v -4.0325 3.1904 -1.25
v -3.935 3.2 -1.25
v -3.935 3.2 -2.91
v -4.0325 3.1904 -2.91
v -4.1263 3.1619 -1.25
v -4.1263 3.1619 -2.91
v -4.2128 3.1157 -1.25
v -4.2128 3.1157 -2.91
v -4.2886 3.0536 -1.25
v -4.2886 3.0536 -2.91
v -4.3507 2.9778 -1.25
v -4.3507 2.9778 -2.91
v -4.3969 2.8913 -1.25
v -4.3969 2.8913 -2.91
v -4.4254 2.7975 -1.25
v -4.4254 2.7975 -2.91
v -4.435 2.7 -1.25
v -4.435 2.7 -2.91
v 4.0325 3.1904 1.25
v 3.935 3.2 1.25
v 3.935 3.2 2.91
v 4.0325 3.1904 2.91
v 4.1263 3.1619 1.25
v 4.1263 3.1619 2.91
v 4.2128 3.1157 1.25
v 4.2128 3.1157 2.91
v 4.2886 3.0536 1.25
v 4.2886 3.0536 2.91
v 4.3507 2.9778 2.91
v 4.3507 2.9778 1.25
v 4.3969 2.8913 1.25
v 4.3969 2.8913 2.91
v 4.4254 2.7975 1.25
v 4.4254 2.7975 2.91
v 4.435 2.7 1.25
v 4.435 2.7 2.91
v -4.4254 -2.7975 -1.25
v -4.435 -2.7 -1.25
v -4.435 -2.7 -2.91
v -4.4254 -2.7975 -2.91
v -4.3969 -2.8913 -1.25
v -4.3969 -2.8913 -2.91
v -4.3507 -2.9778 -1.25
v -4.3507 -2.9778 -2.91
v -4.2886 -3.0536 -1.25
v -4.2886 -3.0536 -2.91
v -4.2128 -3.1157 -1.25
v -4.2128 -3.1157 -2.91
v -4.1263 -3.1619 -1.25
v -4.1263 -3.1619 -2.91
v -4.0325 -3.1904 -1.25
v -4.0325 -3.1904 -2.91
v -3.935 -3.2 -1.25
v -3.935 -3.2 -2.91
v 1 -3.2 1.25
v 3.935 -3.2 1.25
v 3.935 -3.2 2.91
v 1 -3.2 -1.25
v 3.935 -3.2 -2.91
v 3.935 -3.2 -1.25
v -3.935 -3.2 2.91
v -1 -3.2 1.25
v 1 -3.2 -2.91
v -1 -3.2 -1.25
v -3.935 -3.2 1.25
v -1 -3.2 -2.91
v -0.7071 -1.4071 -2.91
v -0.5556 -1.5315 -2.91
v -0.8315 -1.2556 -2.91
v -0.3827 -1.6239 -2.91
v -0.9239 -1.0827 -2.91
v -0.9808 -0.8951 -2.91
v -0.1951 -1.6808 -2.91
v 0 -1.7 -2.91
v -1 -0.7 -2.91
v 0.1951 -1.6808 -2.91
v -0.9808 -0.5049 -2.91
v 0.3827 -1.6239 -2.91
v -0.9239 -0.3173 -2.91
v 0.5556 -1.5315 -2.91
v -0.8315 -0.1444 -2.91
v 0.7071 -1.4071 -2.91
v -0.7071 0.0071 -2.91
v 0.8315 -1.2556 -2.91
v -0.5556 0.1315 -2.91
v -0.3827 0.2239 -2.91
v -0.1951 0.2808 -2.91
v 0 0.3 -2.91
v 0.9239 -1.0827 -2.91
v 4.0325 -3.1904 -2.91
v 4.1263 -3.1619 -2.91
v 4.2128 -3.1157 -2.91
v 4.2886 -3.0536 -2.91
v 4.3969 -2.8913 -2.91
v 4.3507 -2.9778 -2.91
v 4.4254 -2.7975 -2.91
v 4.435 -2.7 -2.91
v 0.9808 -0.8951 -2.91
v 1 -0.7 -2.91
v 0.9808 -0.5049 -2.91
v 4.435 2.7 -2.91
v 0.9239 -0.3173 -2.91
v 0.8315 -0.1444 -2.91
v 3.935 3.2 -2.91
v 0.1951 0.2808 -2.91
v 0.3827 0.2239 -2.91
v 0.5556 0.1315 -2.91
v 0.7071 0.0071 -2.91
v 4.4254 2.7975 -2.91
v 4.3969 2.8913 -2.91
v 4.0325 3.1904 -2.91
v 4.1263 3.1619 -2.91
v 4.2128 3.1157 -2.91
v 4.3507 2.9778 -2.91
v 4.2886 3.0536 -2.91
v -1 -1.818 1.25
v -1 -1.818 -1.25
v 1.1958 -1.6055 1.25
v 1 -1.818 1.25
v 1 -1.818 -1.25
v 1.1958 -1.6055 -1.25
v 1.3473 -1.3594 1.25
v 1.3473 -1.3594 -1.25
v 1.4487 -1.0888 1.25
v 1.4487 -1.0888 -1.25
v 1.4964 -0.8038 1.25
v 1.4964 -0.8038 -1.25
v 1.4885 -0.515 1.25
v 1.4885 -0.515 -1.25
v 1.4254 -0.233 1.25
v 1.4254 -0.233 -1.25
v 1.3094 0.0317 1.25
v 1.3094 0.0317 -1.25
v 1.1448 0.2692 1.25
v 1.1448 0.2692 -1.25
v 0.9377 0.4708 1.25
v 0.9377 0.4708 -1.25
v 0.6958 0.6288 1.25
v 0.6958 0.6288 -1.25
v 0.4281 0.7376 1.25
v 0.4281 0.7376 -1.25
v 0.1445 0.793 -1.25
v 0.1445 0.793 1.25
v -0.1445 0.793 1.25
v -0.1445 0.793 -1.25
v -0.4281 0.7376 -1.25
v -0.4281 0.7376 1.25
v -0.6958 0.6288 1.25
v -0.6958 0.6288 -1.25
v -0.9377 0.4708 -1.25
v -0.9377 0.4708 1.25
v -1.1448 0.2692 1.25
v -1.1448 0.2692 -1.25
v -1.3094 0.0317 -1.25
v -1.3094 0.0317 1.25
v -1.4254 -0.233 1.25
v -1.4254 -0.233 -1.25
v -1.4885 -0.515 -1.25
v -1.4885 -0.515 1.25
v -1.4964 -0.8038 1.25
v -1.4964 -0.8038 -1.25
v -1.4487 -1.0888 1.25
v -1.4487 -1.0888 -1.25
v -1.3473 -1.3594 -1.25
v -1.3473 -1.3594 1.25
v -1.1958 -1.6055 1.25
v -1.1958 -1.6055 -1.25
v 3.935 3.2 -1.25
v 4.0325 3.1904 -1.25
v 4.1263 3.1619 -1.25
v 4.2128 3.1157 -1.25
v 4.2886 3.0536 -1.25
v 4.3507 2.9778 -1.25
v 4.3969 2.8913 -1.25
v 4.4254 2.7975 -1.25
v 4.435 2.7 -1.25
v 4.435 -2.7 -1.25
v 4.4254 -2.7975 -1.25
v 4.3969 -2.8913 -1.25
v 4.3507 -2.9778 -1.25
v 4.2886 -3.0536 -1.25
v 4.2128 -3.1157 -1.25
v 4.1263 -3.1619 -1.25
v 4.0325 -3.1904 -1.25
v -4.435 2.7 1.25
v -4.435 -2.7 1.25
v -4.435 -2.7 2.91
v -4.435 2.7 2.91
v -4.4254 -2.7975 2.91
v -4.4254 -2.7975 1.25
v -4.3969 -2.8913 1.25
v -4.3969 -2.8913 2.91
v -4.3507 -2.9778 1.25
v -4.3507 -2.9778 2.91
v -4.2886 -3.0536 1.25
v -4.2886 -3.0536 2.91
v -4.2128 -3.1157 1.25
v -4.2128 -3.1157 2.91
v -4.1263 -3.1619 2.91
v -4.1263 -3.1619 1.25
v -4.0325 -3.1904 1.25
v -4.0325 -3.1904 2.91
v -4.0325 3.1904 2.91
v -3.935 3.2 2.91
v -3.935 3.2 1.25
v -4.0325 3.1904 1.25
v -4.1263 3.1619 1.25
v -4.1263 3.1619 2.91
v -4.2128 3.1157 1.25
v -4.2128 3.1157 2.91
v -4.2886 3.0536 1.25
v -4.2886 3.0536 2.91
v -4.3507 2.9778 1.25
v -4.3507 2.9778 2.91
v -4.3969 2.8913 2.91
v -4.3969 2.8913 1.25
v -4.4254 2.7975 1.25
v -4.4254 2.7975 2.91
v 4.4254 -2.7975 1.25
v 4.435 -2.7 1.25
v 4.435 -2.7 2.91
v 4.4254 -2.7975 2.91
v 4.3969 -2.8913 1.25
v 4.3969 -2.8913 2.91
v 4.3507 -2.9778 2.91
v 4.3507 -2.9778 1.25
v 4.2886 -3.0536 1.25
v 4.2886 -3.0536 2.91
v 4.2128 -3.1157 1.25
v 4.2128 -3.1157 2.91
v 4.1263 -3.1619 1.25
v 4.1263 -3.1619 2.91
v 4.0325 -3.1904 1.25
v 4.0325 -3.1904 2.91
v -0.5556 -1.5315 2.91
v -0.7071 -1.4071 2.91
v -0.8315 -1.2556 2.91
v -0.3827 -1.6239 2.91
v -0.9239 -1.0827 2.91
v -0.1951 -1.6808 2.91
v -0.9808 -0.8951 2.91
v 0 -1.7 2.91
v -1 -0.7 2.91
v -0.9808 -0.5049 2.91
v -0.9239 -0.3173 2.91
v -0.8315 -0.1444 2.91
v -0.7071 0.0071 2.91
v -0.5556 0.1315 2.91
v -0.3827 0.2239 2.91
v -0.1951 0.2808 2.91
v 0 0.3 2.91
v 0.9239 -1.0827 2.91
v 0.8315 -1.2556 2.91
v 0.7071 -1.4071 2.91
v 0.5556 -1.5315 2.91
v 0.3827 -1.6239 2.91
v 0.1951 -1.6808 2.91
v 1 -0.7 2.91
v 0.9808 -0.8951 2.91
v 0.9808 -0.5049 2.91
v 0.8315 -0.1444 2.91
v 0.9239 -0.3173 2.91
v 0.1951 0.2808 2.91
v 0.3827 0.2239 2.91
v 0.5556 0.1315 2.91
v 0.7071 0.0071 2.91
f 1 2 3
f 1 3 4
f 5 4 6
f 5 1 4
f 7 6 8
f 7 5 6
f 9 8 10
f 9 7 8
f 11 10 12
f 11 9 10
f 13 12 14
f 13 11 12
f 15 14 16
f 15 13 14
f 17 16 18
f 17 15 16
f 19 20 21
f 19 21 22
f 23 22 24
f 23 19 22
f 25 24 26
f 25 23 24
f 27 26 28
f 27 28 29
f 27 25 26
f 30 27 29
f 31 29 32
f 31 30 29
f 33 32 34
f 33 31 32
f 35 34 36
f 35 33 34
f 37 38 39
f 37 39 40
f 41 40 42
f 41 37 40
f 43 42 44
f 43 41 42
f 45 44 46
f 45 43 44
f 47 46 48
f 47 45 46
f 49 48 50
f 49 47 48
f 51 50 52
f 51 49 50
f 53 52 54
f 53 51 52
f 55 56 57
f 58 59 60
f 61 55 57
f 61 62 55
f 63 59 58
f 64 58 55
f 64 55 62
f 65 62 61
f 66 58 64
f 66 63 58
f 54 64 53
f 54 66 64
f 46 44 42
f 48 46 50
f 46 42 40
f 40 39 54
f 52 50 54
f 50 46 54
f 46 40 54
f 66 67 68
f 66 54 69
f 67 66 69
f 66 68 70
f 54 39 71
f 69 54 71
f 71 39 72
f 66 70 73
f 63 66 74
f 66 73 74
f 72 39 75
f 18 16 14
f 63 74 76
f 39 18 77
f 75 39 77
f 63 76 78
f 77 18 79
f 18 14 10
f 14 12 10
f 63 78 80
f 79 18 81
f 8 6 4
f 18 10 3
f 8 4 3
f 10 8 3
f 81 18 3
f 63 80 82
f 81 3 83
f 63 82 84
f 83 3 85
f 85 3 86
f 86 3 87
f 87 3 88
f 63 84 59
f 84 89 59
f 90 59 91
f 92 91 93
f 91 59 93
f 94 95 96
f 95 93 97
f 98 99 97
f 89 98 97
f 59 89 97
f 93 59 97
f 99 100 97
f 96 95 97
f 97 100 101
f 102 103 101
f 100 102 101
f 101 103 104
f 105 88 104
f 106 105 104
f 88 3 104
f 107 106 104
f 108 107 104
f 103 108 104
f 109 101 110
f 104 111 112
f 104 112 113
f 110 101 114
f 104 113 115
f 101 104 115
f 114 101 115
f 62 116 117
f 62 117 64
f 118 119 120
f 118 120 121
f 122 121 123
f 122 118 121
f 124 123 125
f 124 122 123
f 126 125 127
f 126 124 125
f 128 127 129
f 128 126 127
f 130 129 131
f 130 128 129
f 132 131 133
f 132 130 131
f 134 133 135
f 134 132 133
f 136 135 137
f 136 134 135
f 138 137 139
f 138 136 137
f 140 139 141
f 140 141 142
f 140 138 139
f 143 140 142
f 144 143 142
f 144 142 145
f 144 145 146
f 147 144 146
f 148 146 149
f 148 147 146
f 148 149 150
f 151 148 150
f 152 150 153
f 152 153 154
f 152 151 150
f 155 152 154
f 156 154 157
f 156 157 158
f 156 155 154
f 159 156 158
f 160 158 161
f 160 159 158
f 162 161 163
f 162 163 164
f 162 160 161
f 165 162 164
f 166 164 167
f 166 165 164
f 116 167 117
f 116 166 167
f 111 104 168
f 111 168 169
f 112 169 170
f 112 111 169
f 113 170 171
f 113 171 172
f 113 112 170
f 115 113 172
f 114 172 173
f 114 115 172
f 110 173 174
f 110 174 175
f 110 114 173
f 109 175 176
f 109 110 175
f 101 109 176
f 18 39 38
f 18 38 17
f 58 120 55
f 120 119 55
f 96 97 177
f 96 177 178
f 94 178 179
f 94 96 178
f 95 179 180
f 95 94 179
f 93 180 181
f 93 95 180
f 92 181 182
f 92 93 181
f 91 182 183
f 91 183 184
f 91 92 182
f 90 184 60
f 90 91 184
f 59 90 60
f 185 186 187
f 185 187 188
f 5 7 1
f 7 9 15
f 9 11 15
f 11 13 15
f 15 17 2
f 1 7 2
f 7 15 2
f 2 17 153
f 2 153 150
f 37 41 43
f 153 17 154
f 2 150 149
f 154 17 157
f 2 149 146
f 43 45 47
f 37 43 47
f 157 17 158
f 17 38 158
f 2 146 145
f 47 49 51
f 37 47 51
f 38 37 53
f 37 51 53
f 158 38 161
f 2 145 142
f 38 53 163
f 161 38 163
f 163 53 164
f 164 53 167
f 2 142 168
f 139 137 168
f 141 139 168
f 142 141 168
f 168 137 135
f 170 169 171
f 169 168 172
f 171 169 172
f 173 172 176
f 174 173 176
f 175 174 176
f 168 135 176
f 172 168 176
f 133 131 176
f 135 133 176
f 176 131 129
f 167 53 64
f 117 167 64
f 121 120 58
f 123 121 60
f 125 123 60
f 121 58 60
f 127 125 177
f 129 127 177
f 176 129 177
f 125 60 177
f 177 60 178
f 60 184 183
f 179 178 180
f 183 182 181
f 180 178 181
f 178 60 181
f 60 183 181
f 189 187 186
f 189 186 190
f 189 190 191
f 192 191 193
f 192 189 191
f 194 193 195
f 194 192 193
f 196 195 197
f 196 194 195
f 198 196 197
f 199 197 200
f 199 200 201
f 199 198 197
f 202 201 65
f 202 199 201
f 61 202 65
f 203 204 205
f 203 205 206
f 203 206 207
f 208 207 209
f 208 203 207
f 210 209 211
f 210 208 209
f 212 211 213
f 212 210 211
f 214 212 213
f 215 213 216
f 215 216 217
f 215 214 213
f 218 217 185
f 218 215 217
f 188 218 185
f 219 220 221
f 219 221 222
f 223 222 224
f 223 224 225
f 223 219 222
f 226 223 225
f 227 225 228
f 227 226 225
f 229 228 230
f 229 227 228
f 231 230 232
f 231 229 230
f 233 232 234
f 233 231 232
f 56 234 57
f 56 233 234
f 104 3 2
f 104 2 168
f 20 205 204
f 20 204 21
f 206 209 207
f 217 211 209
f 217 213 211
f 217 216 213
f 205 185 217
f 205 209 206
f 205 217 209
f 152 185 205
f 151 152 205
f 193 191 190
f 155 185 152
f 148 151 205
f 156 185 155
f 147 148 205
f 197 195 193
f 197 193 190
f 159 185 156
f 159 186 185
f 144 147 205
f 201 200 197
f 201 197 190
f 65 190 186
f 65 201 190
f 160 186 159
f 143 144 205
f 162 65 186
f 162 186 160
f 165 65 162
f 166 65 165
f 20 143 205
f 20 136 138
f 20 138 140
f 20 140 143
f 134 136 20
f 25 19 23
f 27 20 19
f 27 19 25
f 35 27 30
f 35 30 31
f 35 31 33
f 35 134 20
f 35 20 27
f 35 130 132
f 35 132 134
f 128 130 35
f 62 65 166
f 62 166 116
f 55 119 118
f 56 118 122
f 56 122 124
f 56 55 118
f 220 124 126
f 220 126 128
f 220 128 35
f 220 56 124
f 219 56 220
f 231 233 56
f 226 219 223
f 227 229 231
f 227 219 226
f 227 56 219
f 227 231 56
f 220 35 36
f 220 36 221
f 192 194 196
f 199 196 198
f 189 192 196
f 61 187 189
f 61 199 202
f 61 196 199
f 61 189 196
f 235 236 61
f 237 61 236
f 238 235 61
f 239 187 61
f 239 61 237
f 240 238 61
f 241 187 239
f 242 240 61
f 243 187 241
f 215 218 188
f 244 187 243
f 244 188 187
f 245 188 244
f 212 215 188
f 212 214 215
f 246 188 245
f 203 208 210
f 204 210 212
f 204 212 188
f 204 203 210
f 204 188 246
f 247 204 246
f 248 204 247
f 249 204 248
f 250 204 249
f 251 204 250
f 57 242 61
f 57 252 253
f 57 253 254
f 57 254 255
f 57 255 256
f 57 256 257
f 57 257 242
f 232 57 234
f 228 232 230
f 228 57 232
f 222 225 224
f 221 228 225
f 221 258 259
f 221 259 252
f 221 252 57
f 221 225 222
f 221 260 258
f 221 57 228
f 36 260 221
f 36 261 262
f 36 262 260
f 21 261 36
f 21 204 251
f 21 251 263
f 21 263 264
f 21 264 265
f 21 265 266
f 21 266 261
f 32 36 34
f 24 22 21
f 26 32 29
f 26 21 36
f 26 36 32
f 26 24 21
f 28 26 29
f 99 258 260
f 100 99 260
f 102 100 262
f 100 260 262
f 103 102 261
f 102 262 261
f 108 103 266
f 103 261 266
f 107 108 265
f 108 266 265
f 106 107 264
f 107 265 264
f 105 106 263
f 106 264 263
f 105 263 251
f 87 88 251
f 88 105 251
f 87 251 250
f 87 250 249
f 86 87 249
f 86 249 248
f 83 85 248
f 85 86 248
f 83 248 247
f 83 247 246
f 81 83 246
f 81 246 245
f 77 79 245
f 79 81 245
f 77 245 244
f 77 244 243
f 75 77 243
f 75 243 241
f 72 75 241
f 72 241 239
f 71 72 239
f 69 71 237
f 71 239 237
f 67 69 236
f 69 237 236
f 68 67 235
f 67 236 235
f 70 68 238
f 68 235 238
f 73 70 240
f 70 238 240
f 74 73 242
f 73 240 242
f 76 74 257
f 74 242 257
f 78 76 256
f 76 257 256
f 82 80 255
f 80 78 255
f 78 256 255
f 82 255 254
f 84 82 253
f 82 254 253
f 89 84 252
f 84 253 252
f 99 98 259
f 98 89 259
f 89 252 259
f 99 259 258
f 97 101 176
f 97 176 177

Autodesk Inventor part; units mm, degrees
ref_plane "YZ Plane" through (0, 0, 0) normal (1, 0, 0) x (0, 1, 0)
ref_plane "XZ Plane" through (0, 0, 0) normal (0, 1, 0) x (-1, 0, 0)
sketch "Sketch1" plane through (0, 0, 0) normal (0, 0, 1) x (1, 0, 0)
  line L0 (-4.435, 3.2) -> (4.435, 3.2)
  line L1 (4.435, 3.2) -> (4.435, -3.2)
  line L2 (4.435, -3.2) -> (-4.435, -3.2)
  line L3 (-4.435, -3.2) -> (-4.435, 3.2)
  line L4 (0, 0) -> (4.435, 0) construction
  line L5 (0, 0) -> (0, -3.2) construction
  line L6 (0, 0) -> (0, 3.2) construction
  line L7 (0, 0) -> (-4.435, 0) construction
  dimension "d0" = 8.87
  dimension "d1" = 6.4
extrude "Extrusion1" add sketch "Sketch1" along normal mid plane 5.82
fillet "Fillet1" radius 0.5 4 edges at (4.435, -3.2, 0) (4.435, 3.2, 0) (-4.435, 3.2, 0) (-4.435, -3.2, 0)
sketch "Sketch2" plane through (0, 0, 2.91) normal (0, 0, 1) x (1, 0, 0)
  line L0 (-3.935, 3.2) -> (3.935, 3.2) projected
  circle A0 centre (0, -0.7) radius 1
  point P0 (0, 0)
  dimension "d5" = 3.9
  dimension "d6" = 2
extrude "Extrusion2" cut sketch "Sketch2" against normal through all
ref_plane "Work Plane1" through (-3.935, -0.7, 2.91) normal (0, 1, 0) x (1, 0, 0)
sketch "Sketch5" plane through (-3.935, -0.7, 2.91) normal (0, 1, 0) x (1, 0, 0)
  line L0 (5.435, 1.66) -> (10.1042, 1.66)
  line L1 (10.1042, 1.66) -> (10.1042, 4.16)
  line L2 (10.1042, 4.16) -> (5.435, 4.16)
  line L3 (5.435, 4.16) -> (5.435, 1.66)
  line L4 (3.935, -1.746) -> (3.935, 6.402) projected
  line L5 (7.87, 0) -> (0, 0) projected
  line L6 (0, 5.82) -> (7.87, 5.82) projected
  dimension "d10" = 1.5
  dimension "d11" = 1.66
  dimension "d12" = 1.66
revolve "Revolution1" cut sketch "Sketch5" angle 360 about axis through (0, -0.7, 2.91) along (0, 0, -1)
sketch "Sketch6" plane through (0, 0, 2.91) normal (0, 0, 1) x (1, 0, 0)
  circle A0 centre (0, -0.7) radius 1 projected
  line L0 (3.935, -3.2) -> (-3.935, -3.2) projected
  line L1 (-1, -0.7) -> (-1, -3.2)
  line L2 (1, -0.7) -> (1, -3.2)
extrude "Extrusion3" add sketch "Sketch6" against normal through all contours L2 L0 L1 A0
properties part number "Servo Isolation Mounts1" material "ABS Plastic"
